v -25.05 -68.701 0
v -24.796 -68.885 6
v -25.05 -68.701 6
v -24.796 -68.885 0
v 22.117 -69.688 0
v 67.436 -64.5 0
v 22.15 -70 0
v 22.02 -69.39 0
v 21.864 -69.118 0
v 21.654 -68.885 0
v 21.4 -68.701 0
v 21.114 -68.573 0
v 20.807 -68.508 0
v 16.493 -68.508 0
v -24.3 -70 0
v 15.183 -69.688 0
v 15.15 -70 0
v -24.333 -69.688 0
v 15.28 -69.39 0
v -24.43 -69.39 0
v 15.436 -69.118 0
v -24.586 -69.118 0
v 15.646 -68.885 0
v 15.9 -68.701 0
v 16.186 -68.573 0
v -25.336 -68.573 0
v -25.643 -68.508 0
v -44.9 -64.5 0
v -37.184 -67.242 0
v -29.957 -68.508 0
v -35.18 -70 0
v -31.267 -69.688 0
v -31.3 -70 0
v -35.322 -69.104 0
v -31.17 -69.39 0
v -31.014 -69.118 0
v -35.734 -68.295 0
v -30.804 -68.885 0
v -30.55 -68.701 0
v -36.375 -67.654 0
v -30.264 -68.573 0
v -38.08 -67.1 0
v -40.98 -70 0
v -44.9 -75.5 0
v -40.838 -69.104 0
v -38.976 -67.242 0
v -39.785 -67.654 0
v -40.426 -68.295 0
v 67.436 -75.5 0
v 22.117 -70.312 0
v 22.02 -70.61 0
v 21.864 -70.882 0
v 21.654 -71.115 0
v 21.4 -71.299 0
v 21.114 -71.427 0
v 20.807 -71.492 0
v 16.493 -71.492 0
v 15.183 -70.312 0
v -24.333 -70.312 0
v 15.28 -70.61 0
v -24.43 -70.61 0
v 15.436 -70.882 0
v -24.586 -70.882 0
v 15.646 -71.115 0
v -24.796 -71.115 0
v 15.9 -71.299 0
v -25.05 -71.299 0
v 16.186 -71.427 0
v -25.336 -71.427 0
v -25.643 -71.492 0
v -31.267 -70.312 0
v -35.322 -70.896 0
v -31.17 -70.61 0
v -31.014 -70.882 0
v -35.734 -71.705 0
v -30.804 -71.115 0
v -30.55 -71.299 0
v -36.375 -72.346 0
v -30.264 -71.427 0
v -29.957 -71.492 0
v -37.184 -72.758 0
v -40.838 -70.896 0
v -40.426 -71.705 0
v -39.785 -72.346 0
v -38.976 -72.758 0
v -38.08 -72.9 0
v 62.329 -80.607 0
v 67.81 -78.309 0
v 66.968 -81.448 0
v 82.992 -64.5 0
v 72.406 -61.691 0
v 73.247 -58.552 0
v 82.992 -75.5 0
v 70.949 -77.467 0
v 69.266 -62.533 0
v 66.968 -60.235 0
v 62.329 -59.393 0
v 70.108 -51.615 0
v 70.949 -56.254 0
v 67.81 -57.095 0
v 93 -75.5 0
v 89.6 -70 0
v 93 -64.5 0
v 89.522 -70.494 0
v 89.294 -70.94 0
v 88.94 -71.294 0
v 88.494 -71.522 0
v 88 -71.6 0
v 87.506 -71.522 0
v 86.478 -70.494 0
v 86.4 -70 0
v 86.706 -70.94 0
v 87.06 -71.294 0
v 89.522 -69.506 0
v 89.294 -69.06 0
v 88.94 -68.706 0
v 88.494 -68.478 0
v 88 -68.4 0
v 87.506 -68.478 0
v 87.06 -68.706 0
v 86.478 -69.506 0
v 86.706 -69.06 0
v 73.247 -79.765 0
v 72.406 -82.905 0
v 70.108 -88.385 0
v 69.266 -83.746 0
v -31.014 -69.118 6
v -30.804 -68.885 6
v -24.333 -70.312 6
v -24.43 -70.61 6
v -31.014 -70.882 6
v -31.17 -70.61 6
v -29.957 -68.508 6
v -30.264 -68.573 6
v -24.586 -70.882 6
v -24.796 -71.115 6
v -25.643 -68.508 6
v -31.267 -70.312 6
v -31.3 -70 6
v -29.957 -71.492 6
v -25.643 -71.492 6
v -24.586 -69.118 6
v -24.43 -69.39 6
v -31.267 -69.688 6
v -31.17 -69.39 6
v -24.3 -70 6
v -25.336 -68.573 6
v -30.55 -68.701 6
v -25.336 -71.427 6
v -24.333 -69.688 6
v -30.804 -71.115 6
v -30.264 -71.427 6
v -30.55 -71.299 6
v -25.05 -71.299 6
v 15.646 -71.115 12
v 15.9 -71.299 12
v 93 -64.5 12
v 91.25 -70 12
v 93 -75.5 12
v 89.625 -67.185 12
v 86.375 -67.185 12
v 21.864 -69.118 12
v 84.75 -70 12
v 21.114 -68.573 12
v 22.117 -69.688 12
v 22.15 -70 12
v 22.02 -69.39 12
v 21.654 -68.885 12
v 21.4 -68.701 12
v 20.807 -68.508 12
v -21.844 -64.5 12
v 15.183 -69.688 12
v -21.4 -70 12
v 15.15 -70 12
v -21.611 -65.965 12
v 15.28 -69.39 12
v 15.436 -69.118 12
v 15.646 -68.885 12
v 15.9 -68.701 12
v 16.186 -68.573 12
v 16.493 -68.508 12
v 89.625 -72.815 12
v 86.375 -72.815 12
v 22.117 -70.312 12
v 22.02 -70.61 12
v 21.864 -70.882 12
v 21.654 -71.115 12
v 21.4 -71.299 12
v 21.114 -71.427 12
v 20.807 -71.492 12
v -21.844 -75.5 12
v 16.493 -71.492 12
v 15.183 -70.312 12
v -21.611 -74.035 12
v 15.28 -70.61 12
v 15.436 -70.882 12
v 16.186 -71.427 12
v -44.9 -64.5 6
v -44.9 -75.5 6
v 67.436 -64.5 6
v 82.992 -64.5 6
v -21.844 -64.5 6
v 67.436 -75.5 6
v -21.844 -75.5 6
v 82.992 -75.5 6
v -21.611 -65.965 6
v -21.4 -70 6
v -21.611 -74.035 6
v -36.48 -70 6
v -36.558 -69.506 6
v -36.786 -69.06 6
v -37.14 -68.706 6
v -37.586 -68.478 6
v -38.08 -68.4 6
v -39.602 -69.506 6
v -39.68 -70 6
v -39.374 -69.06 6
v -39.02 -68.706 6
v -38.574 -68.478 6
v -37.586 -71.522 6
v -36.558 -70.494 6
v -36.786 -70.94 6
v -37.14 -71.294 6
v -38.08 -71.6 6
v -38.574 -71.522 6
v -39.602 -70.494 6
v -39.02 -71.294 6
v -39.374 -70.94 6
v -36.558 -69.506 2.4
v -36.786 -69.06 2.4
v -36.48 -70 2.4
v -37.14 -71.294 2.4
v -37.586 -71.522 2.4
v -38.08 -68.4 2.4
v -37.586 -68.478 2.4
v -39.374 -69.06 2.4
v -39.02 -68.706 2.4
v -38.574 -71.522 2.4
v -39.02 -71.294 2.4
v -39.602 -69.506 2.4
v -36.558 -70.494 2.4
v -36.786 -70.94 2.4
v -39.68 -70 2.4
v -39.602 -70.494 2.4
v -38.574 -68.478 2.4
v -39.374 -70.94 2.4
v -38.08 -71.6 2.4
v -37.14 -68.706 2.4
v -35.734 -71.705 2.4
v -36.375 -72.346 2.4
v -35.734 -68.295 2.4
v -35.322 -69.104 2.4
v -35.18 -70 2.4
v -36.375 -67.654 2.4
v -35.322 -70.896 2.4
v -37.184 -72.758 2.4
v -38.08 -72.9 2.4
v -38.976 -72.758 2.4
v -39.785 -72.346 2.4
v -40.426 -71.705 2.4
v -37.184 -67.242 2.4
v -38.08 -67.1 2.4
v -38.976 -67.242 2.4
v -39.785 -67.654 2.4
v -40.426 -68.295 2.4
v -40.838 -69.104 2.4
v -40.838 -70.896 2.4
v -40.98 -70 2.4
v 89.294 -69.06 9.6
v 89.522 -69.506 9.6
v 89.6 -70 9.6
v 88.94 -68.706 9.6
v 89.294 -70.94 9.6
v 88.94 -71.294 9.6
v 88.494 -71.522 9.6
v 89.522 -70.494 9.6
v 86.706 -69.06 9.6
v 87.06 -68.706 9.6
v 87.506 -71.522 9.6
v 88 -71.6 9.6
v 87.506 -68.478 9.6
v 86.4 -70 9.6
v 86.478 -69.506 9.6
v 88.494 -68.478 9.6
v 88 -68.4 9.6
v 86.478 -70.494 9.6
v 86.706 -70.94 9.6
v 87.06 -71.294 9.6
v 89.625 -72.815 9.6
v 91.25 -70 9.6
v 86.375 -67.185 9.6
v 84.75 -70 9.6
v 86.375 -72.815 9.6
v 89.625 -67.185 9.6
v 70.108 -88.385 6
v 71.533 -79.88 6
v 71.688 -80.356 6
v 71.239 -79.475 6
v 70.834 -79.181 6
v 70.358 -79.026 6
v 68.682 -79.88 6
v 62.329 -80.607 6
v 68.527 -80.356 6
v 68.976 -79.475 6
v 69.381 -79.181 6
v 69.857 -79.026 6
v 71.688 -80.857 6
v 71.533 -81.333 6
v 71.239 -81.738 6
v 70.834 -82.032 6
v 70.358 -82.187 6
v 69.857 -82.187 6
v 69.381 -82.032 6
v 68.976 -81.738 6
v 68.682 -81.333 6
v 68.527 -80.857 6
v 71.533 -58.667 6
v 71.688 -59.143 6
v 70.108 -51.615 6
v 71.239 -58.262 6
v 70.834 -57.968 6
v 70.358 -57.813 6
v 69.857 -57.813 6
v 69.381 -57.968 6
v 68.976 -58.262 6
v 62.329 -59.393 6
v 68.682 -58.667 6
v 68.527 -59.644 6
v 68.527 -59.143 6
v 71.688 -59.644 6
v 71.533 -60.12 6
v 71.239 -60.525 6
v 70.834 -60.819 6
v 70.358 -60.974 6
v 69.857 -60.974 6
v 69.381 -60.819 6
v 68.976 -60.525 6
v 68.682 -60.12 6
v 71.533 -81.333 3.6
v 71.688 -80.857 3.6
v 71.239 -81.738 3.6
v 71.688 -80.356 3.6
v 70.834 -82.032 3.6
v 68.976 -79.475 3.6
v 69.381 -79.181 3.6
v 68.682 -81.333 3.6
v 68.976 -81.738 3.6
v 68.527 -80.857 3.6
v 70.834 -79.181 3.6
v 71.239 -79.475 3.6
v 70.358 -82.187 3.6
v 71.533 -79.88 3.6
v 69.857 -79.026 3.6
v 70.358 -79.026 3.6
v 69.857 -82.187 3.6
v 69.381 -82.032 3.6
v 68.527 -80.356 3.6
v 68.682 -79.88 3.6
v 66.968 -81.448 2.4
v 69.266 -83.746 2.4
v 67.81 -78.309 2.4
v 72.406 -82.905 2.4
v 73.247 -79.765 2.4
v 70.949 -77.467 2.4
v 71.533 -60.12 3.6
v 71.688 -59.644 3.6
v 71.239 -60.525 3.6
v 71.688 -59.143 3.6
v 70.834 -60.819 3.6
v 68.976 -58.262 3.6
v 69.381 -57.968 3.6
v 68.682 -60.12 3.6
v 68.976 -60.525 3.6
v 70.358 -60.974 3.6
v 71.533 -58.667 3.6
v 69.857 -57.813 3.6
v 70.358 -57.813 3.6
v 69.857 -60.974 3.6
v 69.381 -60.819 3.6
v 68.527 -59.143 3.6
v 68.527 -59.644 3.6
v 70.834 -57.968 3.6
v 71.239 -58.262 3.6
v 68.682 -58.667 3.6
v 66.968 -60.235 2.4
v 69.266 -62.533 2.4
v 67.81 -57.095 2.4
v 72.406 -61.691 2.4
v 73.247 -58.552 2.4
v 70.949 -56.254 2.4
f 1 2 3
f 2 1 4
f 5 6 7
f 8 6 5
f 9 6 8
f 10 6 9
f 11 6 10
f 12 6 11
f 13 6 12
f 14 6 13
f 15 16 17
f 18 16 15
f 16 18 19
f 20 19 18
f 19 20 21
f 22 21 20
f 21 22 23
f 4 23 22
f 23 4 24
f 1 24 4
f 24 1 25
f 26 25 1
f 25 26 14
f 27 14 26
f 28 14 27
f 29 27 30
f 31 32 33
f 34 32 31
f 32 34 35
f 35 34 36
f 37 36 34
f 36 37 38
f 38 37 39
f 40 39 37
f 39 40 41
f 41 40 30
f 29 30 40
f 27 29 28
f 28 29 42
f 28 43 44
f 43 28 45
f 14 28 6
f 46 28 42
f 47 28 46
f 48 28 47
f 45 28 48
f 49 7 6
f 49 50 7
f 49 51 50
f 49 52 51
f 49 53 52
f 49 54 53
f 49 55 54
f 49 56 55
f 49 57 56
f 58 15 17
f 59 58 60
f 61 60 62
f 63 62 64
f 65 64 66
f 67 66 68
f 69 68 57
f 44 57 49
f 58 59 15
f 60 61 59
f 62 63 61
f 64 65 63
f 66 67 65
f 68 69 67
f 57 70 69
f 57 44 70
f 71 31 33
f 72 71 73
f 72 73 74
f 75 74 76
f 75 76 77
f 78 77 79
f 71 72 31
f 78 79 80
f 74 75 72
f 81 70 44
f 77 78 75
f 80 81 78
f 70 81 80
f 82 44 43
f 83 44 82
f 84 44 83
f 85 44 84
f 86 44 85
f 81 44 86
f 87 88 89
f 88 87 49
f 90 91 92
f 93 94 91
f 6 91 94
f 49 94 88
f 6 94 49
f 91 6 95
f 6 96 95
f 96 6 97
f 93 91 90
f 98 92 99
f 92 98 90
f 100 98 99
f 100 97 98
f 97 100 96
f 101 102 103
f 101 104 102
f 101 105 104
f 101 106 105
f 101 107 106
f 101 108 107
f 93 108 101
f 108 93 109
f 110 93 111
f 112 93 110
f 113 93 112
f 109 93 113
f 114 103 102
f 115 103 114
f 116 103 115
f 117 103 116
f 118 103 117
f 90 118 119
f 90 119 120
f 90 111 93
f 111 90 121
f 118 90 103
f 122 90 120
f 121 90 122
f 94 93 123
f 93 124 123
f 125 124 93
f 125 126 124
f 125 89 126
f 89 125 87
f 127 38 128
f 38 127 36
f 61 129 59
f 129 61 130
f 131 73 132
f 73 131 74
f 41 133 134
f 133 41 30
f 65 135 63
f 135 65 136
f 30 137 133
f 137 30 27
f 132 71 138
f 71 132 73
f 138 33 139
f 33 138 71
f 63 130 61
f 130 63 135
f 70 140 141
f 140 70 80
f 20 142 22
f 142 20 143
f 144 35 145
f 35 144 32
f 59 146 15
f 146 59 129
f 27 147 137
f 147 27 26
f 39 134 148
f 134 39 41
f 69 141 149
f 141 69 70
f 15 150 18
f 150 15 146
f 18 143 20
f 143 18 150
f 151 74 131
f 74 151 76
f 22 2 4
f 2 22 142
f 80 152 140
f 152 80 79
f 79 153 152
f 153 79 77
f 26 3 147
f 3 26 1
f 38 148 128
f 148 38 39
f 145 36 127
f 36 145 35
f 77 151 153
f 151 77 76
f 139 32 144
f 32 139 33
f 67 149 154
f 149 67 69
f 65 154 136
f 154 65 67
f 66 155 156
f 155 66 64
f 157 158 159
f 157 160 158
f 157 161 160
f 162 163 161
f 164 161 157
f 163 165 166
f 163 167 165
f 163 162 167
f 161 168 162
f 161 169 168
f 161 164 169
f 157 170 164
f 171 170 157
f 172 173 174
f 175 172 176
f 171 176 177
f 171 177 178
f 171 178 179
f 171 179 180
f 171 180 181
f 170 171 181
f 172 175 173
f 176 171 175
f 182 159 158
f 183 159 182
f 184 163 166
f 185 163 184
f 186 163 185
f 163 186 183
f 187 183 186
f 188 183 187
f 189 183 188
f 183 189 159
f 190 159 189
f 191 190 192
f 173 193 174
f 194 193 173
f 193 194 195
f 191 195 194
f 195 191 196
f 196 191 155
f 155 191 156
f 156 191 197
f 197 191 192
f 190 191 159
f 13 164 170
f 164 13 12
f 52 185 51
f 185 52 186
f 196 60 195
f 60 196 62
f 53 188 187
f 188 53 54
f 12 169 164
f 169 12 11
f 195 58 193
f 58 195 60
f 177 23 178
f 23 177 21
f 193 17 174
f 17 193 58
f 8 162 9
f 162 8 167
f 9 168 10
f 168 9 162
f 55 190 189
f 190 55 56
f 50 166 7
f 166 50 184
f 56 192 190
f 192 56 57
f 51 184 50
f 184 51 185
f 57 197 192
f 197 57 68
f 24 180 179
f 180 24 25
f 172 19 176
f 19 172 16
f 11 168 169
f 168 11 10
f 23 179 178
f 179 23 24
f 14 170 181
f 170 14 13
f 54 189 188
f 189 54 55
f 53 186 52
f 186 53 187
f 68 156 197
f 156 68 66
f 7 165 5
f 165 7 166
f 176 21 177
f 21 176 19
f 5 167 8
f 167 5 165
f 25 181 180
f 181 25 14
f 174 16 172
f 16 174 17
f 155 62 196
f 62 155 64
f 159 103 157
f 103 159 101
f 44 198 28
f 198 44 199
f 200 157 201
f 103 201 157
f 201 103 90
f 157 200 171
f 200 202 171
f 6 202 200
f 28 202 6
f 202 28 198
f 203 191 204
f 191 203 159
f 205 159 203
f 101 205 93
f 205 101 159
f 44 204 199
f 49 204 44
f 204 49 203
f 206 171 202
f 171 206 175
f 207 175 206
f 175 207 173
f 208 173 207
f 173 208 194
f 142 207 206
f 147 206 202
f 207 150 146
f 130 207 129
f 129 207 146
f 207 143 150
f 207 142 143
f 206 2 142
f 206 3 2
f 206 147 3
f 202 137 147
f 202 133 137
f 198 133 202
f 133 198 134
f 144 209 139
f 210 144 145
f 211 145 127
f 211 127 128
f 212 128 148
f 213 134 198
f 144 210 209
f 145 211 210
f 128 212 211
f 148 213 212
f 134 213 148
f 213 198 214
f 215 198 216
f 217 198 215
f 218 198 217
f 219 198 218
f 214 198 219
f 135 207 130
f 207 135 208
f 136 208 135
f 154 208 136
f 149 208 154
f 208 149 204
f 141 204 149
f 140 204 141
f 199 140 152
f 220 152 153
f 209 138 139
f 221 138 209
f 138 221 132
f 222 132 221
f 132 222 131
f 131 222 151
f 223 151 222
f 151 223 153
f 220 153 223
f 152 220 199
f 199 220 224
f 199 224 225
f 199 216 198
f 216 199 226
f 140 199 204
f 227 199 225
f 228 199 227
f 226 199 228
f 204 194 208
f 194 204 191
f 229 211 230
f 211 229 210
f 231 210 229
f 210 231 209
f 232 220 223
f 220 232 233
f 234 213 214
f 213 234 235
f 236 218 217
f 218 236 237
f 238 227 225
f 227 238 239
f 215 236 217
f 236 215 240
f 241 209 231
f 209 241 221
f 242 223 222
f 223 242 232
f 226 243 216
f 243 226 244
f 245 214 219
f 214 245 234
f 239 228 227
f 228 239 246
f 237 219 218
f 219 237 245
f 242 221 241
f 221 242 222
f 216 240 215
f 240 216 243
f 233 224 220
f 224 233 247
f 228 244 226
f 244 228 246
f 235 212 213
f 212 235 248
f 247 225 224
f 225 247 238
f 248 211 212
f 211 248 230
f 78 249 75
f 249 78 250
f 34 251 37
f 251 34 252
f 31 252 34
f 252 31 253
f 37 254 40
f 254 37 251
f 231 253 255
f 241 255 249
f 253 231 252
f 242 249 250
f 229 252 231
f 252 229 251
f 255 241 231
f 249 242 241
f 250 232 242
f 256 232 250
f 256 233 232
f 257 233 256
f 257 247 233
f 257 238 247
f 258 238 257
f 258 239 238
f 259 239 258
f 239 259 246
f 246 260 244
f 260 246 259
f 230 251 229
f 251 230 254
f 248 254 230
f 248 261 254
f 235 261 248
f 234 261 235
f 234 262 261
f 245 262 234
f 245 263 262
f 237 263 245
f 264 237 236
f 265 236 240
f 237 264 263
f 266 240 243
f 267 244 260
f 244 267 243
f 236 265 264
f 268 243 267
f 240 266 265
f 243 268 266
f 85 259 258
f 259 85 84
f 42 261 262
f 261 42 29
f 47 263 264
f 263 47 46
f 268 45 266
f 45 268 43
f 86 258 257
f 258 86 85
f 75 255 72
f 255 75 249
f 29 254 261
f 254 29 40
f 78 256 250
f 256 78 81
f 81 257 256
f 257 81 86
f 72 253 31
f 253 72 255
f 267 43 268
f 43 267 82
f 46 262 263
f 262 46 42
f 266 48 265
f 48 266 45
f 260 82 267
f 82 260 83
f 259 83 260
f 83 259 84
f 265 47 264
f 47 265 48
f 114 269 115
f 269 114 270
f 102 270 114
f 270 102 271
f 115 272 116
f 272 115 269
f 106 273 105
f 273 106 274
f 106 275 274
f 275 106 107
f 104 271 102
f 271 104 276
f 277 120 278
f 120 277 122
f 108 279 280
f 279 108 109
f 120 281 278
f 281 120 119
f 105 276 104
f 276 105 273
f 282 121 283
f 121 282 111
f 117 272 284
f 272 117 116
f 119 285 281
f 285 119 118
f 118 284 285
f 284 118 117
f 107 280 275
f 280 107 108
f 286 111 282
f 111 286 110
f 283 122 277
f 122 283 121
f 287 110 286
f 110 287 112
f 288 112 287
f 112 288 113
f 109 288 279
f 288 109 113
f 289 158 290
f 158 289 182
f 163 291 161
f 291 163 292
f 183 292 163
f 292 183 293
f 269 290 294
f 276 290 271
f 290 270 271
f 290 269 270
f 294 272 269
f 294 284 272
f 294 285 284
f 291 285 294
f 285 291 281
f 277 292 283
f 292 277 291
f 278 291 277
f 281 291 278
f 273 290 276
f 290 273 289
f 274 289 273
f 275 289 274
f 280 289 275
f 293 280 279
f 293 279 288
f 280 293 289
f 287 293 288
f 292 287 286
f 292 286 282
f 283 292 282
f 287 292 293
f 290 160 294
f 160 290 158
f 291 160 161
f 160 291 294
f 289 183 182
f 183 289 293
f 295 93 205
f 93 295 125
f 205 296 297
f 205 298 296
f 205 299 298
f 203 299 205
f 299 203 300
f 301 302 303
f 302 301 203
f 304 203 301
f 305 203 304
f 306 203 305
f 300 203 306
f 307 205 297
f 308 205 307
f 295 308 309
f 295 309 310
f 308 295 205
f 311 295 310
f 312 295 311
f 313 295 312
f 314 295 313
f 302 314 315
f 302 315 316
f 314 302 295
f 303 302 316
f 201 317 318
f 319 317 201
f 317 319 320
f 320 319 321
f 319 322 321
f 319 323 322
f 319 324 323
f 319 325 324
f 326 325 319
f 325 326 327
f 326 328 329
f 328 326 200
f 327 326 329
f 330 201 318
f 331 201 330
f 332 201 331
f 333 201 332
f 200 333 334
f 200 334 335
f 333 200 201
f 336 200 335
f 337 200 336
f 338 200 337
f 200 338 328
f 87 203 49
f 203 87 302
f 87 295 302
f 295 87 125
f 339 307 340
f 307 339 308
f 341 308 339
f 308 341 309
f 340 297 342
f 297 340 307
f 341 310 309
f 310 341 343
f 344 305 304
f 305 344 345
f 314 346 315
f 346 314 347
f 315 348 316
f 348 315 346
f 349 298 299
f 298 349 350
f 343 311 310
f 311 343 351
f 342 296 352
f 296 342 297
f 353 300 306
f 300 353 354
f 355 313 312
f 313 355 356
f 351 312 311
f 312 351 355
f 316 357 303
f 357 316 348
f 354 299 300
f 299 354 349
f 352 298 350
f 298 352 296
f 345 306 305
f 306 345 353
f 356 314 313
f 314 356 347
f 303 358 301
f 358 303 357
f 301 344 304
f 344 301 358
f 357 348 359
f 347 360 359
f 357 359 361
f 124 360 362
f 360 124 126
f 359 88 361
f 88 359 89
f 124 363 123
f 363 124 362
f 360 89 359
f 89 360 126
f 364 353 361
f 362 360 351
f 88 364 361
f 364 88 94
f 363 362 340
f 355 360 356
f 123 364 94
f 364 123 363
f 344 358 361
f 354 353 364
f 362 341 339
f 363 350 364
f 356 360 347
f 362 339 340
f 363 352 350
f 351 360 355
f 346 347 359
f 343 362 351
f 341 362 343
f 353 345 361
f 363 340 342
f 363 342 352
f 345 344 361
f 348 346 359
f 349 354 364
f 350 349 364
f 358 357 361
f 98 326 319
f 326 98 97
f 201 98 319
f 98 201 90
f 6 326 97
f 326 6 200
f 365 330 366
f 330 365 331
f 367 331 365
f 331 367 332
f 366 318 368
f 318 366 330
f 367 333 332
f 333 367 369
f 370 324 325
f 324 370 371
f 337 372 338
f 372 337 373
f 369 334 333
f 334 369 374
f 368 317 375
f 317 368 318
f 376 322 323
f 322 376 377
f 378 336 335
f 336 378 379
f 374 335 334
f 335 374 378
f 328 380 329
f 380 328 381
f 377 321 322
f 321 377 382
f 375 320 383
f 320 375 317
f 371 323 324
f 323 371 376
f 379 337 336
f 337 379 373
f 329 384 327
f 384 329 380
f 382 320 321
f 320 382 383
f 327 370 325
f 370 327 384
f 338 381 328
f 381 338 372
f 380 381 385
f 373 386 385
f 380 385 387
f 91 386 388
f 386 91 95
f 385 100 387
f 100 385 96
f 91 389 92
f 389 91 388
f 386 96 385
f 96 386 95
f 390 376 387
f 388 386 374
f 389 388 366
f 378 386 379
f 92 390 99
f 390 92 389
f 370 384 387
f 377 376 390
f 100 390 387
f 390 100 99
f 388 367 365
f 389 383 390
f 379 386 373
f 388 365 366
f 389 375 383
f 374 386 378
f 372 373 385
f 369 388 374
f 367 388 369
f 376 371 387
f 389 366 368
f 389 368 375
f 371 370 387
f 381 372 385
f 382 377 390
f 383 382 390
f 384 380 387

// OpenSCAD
use <bed_carriage.scad>

height = 12;
translate([-60,-70]) rotate([0,0,315]) corner_arm();
